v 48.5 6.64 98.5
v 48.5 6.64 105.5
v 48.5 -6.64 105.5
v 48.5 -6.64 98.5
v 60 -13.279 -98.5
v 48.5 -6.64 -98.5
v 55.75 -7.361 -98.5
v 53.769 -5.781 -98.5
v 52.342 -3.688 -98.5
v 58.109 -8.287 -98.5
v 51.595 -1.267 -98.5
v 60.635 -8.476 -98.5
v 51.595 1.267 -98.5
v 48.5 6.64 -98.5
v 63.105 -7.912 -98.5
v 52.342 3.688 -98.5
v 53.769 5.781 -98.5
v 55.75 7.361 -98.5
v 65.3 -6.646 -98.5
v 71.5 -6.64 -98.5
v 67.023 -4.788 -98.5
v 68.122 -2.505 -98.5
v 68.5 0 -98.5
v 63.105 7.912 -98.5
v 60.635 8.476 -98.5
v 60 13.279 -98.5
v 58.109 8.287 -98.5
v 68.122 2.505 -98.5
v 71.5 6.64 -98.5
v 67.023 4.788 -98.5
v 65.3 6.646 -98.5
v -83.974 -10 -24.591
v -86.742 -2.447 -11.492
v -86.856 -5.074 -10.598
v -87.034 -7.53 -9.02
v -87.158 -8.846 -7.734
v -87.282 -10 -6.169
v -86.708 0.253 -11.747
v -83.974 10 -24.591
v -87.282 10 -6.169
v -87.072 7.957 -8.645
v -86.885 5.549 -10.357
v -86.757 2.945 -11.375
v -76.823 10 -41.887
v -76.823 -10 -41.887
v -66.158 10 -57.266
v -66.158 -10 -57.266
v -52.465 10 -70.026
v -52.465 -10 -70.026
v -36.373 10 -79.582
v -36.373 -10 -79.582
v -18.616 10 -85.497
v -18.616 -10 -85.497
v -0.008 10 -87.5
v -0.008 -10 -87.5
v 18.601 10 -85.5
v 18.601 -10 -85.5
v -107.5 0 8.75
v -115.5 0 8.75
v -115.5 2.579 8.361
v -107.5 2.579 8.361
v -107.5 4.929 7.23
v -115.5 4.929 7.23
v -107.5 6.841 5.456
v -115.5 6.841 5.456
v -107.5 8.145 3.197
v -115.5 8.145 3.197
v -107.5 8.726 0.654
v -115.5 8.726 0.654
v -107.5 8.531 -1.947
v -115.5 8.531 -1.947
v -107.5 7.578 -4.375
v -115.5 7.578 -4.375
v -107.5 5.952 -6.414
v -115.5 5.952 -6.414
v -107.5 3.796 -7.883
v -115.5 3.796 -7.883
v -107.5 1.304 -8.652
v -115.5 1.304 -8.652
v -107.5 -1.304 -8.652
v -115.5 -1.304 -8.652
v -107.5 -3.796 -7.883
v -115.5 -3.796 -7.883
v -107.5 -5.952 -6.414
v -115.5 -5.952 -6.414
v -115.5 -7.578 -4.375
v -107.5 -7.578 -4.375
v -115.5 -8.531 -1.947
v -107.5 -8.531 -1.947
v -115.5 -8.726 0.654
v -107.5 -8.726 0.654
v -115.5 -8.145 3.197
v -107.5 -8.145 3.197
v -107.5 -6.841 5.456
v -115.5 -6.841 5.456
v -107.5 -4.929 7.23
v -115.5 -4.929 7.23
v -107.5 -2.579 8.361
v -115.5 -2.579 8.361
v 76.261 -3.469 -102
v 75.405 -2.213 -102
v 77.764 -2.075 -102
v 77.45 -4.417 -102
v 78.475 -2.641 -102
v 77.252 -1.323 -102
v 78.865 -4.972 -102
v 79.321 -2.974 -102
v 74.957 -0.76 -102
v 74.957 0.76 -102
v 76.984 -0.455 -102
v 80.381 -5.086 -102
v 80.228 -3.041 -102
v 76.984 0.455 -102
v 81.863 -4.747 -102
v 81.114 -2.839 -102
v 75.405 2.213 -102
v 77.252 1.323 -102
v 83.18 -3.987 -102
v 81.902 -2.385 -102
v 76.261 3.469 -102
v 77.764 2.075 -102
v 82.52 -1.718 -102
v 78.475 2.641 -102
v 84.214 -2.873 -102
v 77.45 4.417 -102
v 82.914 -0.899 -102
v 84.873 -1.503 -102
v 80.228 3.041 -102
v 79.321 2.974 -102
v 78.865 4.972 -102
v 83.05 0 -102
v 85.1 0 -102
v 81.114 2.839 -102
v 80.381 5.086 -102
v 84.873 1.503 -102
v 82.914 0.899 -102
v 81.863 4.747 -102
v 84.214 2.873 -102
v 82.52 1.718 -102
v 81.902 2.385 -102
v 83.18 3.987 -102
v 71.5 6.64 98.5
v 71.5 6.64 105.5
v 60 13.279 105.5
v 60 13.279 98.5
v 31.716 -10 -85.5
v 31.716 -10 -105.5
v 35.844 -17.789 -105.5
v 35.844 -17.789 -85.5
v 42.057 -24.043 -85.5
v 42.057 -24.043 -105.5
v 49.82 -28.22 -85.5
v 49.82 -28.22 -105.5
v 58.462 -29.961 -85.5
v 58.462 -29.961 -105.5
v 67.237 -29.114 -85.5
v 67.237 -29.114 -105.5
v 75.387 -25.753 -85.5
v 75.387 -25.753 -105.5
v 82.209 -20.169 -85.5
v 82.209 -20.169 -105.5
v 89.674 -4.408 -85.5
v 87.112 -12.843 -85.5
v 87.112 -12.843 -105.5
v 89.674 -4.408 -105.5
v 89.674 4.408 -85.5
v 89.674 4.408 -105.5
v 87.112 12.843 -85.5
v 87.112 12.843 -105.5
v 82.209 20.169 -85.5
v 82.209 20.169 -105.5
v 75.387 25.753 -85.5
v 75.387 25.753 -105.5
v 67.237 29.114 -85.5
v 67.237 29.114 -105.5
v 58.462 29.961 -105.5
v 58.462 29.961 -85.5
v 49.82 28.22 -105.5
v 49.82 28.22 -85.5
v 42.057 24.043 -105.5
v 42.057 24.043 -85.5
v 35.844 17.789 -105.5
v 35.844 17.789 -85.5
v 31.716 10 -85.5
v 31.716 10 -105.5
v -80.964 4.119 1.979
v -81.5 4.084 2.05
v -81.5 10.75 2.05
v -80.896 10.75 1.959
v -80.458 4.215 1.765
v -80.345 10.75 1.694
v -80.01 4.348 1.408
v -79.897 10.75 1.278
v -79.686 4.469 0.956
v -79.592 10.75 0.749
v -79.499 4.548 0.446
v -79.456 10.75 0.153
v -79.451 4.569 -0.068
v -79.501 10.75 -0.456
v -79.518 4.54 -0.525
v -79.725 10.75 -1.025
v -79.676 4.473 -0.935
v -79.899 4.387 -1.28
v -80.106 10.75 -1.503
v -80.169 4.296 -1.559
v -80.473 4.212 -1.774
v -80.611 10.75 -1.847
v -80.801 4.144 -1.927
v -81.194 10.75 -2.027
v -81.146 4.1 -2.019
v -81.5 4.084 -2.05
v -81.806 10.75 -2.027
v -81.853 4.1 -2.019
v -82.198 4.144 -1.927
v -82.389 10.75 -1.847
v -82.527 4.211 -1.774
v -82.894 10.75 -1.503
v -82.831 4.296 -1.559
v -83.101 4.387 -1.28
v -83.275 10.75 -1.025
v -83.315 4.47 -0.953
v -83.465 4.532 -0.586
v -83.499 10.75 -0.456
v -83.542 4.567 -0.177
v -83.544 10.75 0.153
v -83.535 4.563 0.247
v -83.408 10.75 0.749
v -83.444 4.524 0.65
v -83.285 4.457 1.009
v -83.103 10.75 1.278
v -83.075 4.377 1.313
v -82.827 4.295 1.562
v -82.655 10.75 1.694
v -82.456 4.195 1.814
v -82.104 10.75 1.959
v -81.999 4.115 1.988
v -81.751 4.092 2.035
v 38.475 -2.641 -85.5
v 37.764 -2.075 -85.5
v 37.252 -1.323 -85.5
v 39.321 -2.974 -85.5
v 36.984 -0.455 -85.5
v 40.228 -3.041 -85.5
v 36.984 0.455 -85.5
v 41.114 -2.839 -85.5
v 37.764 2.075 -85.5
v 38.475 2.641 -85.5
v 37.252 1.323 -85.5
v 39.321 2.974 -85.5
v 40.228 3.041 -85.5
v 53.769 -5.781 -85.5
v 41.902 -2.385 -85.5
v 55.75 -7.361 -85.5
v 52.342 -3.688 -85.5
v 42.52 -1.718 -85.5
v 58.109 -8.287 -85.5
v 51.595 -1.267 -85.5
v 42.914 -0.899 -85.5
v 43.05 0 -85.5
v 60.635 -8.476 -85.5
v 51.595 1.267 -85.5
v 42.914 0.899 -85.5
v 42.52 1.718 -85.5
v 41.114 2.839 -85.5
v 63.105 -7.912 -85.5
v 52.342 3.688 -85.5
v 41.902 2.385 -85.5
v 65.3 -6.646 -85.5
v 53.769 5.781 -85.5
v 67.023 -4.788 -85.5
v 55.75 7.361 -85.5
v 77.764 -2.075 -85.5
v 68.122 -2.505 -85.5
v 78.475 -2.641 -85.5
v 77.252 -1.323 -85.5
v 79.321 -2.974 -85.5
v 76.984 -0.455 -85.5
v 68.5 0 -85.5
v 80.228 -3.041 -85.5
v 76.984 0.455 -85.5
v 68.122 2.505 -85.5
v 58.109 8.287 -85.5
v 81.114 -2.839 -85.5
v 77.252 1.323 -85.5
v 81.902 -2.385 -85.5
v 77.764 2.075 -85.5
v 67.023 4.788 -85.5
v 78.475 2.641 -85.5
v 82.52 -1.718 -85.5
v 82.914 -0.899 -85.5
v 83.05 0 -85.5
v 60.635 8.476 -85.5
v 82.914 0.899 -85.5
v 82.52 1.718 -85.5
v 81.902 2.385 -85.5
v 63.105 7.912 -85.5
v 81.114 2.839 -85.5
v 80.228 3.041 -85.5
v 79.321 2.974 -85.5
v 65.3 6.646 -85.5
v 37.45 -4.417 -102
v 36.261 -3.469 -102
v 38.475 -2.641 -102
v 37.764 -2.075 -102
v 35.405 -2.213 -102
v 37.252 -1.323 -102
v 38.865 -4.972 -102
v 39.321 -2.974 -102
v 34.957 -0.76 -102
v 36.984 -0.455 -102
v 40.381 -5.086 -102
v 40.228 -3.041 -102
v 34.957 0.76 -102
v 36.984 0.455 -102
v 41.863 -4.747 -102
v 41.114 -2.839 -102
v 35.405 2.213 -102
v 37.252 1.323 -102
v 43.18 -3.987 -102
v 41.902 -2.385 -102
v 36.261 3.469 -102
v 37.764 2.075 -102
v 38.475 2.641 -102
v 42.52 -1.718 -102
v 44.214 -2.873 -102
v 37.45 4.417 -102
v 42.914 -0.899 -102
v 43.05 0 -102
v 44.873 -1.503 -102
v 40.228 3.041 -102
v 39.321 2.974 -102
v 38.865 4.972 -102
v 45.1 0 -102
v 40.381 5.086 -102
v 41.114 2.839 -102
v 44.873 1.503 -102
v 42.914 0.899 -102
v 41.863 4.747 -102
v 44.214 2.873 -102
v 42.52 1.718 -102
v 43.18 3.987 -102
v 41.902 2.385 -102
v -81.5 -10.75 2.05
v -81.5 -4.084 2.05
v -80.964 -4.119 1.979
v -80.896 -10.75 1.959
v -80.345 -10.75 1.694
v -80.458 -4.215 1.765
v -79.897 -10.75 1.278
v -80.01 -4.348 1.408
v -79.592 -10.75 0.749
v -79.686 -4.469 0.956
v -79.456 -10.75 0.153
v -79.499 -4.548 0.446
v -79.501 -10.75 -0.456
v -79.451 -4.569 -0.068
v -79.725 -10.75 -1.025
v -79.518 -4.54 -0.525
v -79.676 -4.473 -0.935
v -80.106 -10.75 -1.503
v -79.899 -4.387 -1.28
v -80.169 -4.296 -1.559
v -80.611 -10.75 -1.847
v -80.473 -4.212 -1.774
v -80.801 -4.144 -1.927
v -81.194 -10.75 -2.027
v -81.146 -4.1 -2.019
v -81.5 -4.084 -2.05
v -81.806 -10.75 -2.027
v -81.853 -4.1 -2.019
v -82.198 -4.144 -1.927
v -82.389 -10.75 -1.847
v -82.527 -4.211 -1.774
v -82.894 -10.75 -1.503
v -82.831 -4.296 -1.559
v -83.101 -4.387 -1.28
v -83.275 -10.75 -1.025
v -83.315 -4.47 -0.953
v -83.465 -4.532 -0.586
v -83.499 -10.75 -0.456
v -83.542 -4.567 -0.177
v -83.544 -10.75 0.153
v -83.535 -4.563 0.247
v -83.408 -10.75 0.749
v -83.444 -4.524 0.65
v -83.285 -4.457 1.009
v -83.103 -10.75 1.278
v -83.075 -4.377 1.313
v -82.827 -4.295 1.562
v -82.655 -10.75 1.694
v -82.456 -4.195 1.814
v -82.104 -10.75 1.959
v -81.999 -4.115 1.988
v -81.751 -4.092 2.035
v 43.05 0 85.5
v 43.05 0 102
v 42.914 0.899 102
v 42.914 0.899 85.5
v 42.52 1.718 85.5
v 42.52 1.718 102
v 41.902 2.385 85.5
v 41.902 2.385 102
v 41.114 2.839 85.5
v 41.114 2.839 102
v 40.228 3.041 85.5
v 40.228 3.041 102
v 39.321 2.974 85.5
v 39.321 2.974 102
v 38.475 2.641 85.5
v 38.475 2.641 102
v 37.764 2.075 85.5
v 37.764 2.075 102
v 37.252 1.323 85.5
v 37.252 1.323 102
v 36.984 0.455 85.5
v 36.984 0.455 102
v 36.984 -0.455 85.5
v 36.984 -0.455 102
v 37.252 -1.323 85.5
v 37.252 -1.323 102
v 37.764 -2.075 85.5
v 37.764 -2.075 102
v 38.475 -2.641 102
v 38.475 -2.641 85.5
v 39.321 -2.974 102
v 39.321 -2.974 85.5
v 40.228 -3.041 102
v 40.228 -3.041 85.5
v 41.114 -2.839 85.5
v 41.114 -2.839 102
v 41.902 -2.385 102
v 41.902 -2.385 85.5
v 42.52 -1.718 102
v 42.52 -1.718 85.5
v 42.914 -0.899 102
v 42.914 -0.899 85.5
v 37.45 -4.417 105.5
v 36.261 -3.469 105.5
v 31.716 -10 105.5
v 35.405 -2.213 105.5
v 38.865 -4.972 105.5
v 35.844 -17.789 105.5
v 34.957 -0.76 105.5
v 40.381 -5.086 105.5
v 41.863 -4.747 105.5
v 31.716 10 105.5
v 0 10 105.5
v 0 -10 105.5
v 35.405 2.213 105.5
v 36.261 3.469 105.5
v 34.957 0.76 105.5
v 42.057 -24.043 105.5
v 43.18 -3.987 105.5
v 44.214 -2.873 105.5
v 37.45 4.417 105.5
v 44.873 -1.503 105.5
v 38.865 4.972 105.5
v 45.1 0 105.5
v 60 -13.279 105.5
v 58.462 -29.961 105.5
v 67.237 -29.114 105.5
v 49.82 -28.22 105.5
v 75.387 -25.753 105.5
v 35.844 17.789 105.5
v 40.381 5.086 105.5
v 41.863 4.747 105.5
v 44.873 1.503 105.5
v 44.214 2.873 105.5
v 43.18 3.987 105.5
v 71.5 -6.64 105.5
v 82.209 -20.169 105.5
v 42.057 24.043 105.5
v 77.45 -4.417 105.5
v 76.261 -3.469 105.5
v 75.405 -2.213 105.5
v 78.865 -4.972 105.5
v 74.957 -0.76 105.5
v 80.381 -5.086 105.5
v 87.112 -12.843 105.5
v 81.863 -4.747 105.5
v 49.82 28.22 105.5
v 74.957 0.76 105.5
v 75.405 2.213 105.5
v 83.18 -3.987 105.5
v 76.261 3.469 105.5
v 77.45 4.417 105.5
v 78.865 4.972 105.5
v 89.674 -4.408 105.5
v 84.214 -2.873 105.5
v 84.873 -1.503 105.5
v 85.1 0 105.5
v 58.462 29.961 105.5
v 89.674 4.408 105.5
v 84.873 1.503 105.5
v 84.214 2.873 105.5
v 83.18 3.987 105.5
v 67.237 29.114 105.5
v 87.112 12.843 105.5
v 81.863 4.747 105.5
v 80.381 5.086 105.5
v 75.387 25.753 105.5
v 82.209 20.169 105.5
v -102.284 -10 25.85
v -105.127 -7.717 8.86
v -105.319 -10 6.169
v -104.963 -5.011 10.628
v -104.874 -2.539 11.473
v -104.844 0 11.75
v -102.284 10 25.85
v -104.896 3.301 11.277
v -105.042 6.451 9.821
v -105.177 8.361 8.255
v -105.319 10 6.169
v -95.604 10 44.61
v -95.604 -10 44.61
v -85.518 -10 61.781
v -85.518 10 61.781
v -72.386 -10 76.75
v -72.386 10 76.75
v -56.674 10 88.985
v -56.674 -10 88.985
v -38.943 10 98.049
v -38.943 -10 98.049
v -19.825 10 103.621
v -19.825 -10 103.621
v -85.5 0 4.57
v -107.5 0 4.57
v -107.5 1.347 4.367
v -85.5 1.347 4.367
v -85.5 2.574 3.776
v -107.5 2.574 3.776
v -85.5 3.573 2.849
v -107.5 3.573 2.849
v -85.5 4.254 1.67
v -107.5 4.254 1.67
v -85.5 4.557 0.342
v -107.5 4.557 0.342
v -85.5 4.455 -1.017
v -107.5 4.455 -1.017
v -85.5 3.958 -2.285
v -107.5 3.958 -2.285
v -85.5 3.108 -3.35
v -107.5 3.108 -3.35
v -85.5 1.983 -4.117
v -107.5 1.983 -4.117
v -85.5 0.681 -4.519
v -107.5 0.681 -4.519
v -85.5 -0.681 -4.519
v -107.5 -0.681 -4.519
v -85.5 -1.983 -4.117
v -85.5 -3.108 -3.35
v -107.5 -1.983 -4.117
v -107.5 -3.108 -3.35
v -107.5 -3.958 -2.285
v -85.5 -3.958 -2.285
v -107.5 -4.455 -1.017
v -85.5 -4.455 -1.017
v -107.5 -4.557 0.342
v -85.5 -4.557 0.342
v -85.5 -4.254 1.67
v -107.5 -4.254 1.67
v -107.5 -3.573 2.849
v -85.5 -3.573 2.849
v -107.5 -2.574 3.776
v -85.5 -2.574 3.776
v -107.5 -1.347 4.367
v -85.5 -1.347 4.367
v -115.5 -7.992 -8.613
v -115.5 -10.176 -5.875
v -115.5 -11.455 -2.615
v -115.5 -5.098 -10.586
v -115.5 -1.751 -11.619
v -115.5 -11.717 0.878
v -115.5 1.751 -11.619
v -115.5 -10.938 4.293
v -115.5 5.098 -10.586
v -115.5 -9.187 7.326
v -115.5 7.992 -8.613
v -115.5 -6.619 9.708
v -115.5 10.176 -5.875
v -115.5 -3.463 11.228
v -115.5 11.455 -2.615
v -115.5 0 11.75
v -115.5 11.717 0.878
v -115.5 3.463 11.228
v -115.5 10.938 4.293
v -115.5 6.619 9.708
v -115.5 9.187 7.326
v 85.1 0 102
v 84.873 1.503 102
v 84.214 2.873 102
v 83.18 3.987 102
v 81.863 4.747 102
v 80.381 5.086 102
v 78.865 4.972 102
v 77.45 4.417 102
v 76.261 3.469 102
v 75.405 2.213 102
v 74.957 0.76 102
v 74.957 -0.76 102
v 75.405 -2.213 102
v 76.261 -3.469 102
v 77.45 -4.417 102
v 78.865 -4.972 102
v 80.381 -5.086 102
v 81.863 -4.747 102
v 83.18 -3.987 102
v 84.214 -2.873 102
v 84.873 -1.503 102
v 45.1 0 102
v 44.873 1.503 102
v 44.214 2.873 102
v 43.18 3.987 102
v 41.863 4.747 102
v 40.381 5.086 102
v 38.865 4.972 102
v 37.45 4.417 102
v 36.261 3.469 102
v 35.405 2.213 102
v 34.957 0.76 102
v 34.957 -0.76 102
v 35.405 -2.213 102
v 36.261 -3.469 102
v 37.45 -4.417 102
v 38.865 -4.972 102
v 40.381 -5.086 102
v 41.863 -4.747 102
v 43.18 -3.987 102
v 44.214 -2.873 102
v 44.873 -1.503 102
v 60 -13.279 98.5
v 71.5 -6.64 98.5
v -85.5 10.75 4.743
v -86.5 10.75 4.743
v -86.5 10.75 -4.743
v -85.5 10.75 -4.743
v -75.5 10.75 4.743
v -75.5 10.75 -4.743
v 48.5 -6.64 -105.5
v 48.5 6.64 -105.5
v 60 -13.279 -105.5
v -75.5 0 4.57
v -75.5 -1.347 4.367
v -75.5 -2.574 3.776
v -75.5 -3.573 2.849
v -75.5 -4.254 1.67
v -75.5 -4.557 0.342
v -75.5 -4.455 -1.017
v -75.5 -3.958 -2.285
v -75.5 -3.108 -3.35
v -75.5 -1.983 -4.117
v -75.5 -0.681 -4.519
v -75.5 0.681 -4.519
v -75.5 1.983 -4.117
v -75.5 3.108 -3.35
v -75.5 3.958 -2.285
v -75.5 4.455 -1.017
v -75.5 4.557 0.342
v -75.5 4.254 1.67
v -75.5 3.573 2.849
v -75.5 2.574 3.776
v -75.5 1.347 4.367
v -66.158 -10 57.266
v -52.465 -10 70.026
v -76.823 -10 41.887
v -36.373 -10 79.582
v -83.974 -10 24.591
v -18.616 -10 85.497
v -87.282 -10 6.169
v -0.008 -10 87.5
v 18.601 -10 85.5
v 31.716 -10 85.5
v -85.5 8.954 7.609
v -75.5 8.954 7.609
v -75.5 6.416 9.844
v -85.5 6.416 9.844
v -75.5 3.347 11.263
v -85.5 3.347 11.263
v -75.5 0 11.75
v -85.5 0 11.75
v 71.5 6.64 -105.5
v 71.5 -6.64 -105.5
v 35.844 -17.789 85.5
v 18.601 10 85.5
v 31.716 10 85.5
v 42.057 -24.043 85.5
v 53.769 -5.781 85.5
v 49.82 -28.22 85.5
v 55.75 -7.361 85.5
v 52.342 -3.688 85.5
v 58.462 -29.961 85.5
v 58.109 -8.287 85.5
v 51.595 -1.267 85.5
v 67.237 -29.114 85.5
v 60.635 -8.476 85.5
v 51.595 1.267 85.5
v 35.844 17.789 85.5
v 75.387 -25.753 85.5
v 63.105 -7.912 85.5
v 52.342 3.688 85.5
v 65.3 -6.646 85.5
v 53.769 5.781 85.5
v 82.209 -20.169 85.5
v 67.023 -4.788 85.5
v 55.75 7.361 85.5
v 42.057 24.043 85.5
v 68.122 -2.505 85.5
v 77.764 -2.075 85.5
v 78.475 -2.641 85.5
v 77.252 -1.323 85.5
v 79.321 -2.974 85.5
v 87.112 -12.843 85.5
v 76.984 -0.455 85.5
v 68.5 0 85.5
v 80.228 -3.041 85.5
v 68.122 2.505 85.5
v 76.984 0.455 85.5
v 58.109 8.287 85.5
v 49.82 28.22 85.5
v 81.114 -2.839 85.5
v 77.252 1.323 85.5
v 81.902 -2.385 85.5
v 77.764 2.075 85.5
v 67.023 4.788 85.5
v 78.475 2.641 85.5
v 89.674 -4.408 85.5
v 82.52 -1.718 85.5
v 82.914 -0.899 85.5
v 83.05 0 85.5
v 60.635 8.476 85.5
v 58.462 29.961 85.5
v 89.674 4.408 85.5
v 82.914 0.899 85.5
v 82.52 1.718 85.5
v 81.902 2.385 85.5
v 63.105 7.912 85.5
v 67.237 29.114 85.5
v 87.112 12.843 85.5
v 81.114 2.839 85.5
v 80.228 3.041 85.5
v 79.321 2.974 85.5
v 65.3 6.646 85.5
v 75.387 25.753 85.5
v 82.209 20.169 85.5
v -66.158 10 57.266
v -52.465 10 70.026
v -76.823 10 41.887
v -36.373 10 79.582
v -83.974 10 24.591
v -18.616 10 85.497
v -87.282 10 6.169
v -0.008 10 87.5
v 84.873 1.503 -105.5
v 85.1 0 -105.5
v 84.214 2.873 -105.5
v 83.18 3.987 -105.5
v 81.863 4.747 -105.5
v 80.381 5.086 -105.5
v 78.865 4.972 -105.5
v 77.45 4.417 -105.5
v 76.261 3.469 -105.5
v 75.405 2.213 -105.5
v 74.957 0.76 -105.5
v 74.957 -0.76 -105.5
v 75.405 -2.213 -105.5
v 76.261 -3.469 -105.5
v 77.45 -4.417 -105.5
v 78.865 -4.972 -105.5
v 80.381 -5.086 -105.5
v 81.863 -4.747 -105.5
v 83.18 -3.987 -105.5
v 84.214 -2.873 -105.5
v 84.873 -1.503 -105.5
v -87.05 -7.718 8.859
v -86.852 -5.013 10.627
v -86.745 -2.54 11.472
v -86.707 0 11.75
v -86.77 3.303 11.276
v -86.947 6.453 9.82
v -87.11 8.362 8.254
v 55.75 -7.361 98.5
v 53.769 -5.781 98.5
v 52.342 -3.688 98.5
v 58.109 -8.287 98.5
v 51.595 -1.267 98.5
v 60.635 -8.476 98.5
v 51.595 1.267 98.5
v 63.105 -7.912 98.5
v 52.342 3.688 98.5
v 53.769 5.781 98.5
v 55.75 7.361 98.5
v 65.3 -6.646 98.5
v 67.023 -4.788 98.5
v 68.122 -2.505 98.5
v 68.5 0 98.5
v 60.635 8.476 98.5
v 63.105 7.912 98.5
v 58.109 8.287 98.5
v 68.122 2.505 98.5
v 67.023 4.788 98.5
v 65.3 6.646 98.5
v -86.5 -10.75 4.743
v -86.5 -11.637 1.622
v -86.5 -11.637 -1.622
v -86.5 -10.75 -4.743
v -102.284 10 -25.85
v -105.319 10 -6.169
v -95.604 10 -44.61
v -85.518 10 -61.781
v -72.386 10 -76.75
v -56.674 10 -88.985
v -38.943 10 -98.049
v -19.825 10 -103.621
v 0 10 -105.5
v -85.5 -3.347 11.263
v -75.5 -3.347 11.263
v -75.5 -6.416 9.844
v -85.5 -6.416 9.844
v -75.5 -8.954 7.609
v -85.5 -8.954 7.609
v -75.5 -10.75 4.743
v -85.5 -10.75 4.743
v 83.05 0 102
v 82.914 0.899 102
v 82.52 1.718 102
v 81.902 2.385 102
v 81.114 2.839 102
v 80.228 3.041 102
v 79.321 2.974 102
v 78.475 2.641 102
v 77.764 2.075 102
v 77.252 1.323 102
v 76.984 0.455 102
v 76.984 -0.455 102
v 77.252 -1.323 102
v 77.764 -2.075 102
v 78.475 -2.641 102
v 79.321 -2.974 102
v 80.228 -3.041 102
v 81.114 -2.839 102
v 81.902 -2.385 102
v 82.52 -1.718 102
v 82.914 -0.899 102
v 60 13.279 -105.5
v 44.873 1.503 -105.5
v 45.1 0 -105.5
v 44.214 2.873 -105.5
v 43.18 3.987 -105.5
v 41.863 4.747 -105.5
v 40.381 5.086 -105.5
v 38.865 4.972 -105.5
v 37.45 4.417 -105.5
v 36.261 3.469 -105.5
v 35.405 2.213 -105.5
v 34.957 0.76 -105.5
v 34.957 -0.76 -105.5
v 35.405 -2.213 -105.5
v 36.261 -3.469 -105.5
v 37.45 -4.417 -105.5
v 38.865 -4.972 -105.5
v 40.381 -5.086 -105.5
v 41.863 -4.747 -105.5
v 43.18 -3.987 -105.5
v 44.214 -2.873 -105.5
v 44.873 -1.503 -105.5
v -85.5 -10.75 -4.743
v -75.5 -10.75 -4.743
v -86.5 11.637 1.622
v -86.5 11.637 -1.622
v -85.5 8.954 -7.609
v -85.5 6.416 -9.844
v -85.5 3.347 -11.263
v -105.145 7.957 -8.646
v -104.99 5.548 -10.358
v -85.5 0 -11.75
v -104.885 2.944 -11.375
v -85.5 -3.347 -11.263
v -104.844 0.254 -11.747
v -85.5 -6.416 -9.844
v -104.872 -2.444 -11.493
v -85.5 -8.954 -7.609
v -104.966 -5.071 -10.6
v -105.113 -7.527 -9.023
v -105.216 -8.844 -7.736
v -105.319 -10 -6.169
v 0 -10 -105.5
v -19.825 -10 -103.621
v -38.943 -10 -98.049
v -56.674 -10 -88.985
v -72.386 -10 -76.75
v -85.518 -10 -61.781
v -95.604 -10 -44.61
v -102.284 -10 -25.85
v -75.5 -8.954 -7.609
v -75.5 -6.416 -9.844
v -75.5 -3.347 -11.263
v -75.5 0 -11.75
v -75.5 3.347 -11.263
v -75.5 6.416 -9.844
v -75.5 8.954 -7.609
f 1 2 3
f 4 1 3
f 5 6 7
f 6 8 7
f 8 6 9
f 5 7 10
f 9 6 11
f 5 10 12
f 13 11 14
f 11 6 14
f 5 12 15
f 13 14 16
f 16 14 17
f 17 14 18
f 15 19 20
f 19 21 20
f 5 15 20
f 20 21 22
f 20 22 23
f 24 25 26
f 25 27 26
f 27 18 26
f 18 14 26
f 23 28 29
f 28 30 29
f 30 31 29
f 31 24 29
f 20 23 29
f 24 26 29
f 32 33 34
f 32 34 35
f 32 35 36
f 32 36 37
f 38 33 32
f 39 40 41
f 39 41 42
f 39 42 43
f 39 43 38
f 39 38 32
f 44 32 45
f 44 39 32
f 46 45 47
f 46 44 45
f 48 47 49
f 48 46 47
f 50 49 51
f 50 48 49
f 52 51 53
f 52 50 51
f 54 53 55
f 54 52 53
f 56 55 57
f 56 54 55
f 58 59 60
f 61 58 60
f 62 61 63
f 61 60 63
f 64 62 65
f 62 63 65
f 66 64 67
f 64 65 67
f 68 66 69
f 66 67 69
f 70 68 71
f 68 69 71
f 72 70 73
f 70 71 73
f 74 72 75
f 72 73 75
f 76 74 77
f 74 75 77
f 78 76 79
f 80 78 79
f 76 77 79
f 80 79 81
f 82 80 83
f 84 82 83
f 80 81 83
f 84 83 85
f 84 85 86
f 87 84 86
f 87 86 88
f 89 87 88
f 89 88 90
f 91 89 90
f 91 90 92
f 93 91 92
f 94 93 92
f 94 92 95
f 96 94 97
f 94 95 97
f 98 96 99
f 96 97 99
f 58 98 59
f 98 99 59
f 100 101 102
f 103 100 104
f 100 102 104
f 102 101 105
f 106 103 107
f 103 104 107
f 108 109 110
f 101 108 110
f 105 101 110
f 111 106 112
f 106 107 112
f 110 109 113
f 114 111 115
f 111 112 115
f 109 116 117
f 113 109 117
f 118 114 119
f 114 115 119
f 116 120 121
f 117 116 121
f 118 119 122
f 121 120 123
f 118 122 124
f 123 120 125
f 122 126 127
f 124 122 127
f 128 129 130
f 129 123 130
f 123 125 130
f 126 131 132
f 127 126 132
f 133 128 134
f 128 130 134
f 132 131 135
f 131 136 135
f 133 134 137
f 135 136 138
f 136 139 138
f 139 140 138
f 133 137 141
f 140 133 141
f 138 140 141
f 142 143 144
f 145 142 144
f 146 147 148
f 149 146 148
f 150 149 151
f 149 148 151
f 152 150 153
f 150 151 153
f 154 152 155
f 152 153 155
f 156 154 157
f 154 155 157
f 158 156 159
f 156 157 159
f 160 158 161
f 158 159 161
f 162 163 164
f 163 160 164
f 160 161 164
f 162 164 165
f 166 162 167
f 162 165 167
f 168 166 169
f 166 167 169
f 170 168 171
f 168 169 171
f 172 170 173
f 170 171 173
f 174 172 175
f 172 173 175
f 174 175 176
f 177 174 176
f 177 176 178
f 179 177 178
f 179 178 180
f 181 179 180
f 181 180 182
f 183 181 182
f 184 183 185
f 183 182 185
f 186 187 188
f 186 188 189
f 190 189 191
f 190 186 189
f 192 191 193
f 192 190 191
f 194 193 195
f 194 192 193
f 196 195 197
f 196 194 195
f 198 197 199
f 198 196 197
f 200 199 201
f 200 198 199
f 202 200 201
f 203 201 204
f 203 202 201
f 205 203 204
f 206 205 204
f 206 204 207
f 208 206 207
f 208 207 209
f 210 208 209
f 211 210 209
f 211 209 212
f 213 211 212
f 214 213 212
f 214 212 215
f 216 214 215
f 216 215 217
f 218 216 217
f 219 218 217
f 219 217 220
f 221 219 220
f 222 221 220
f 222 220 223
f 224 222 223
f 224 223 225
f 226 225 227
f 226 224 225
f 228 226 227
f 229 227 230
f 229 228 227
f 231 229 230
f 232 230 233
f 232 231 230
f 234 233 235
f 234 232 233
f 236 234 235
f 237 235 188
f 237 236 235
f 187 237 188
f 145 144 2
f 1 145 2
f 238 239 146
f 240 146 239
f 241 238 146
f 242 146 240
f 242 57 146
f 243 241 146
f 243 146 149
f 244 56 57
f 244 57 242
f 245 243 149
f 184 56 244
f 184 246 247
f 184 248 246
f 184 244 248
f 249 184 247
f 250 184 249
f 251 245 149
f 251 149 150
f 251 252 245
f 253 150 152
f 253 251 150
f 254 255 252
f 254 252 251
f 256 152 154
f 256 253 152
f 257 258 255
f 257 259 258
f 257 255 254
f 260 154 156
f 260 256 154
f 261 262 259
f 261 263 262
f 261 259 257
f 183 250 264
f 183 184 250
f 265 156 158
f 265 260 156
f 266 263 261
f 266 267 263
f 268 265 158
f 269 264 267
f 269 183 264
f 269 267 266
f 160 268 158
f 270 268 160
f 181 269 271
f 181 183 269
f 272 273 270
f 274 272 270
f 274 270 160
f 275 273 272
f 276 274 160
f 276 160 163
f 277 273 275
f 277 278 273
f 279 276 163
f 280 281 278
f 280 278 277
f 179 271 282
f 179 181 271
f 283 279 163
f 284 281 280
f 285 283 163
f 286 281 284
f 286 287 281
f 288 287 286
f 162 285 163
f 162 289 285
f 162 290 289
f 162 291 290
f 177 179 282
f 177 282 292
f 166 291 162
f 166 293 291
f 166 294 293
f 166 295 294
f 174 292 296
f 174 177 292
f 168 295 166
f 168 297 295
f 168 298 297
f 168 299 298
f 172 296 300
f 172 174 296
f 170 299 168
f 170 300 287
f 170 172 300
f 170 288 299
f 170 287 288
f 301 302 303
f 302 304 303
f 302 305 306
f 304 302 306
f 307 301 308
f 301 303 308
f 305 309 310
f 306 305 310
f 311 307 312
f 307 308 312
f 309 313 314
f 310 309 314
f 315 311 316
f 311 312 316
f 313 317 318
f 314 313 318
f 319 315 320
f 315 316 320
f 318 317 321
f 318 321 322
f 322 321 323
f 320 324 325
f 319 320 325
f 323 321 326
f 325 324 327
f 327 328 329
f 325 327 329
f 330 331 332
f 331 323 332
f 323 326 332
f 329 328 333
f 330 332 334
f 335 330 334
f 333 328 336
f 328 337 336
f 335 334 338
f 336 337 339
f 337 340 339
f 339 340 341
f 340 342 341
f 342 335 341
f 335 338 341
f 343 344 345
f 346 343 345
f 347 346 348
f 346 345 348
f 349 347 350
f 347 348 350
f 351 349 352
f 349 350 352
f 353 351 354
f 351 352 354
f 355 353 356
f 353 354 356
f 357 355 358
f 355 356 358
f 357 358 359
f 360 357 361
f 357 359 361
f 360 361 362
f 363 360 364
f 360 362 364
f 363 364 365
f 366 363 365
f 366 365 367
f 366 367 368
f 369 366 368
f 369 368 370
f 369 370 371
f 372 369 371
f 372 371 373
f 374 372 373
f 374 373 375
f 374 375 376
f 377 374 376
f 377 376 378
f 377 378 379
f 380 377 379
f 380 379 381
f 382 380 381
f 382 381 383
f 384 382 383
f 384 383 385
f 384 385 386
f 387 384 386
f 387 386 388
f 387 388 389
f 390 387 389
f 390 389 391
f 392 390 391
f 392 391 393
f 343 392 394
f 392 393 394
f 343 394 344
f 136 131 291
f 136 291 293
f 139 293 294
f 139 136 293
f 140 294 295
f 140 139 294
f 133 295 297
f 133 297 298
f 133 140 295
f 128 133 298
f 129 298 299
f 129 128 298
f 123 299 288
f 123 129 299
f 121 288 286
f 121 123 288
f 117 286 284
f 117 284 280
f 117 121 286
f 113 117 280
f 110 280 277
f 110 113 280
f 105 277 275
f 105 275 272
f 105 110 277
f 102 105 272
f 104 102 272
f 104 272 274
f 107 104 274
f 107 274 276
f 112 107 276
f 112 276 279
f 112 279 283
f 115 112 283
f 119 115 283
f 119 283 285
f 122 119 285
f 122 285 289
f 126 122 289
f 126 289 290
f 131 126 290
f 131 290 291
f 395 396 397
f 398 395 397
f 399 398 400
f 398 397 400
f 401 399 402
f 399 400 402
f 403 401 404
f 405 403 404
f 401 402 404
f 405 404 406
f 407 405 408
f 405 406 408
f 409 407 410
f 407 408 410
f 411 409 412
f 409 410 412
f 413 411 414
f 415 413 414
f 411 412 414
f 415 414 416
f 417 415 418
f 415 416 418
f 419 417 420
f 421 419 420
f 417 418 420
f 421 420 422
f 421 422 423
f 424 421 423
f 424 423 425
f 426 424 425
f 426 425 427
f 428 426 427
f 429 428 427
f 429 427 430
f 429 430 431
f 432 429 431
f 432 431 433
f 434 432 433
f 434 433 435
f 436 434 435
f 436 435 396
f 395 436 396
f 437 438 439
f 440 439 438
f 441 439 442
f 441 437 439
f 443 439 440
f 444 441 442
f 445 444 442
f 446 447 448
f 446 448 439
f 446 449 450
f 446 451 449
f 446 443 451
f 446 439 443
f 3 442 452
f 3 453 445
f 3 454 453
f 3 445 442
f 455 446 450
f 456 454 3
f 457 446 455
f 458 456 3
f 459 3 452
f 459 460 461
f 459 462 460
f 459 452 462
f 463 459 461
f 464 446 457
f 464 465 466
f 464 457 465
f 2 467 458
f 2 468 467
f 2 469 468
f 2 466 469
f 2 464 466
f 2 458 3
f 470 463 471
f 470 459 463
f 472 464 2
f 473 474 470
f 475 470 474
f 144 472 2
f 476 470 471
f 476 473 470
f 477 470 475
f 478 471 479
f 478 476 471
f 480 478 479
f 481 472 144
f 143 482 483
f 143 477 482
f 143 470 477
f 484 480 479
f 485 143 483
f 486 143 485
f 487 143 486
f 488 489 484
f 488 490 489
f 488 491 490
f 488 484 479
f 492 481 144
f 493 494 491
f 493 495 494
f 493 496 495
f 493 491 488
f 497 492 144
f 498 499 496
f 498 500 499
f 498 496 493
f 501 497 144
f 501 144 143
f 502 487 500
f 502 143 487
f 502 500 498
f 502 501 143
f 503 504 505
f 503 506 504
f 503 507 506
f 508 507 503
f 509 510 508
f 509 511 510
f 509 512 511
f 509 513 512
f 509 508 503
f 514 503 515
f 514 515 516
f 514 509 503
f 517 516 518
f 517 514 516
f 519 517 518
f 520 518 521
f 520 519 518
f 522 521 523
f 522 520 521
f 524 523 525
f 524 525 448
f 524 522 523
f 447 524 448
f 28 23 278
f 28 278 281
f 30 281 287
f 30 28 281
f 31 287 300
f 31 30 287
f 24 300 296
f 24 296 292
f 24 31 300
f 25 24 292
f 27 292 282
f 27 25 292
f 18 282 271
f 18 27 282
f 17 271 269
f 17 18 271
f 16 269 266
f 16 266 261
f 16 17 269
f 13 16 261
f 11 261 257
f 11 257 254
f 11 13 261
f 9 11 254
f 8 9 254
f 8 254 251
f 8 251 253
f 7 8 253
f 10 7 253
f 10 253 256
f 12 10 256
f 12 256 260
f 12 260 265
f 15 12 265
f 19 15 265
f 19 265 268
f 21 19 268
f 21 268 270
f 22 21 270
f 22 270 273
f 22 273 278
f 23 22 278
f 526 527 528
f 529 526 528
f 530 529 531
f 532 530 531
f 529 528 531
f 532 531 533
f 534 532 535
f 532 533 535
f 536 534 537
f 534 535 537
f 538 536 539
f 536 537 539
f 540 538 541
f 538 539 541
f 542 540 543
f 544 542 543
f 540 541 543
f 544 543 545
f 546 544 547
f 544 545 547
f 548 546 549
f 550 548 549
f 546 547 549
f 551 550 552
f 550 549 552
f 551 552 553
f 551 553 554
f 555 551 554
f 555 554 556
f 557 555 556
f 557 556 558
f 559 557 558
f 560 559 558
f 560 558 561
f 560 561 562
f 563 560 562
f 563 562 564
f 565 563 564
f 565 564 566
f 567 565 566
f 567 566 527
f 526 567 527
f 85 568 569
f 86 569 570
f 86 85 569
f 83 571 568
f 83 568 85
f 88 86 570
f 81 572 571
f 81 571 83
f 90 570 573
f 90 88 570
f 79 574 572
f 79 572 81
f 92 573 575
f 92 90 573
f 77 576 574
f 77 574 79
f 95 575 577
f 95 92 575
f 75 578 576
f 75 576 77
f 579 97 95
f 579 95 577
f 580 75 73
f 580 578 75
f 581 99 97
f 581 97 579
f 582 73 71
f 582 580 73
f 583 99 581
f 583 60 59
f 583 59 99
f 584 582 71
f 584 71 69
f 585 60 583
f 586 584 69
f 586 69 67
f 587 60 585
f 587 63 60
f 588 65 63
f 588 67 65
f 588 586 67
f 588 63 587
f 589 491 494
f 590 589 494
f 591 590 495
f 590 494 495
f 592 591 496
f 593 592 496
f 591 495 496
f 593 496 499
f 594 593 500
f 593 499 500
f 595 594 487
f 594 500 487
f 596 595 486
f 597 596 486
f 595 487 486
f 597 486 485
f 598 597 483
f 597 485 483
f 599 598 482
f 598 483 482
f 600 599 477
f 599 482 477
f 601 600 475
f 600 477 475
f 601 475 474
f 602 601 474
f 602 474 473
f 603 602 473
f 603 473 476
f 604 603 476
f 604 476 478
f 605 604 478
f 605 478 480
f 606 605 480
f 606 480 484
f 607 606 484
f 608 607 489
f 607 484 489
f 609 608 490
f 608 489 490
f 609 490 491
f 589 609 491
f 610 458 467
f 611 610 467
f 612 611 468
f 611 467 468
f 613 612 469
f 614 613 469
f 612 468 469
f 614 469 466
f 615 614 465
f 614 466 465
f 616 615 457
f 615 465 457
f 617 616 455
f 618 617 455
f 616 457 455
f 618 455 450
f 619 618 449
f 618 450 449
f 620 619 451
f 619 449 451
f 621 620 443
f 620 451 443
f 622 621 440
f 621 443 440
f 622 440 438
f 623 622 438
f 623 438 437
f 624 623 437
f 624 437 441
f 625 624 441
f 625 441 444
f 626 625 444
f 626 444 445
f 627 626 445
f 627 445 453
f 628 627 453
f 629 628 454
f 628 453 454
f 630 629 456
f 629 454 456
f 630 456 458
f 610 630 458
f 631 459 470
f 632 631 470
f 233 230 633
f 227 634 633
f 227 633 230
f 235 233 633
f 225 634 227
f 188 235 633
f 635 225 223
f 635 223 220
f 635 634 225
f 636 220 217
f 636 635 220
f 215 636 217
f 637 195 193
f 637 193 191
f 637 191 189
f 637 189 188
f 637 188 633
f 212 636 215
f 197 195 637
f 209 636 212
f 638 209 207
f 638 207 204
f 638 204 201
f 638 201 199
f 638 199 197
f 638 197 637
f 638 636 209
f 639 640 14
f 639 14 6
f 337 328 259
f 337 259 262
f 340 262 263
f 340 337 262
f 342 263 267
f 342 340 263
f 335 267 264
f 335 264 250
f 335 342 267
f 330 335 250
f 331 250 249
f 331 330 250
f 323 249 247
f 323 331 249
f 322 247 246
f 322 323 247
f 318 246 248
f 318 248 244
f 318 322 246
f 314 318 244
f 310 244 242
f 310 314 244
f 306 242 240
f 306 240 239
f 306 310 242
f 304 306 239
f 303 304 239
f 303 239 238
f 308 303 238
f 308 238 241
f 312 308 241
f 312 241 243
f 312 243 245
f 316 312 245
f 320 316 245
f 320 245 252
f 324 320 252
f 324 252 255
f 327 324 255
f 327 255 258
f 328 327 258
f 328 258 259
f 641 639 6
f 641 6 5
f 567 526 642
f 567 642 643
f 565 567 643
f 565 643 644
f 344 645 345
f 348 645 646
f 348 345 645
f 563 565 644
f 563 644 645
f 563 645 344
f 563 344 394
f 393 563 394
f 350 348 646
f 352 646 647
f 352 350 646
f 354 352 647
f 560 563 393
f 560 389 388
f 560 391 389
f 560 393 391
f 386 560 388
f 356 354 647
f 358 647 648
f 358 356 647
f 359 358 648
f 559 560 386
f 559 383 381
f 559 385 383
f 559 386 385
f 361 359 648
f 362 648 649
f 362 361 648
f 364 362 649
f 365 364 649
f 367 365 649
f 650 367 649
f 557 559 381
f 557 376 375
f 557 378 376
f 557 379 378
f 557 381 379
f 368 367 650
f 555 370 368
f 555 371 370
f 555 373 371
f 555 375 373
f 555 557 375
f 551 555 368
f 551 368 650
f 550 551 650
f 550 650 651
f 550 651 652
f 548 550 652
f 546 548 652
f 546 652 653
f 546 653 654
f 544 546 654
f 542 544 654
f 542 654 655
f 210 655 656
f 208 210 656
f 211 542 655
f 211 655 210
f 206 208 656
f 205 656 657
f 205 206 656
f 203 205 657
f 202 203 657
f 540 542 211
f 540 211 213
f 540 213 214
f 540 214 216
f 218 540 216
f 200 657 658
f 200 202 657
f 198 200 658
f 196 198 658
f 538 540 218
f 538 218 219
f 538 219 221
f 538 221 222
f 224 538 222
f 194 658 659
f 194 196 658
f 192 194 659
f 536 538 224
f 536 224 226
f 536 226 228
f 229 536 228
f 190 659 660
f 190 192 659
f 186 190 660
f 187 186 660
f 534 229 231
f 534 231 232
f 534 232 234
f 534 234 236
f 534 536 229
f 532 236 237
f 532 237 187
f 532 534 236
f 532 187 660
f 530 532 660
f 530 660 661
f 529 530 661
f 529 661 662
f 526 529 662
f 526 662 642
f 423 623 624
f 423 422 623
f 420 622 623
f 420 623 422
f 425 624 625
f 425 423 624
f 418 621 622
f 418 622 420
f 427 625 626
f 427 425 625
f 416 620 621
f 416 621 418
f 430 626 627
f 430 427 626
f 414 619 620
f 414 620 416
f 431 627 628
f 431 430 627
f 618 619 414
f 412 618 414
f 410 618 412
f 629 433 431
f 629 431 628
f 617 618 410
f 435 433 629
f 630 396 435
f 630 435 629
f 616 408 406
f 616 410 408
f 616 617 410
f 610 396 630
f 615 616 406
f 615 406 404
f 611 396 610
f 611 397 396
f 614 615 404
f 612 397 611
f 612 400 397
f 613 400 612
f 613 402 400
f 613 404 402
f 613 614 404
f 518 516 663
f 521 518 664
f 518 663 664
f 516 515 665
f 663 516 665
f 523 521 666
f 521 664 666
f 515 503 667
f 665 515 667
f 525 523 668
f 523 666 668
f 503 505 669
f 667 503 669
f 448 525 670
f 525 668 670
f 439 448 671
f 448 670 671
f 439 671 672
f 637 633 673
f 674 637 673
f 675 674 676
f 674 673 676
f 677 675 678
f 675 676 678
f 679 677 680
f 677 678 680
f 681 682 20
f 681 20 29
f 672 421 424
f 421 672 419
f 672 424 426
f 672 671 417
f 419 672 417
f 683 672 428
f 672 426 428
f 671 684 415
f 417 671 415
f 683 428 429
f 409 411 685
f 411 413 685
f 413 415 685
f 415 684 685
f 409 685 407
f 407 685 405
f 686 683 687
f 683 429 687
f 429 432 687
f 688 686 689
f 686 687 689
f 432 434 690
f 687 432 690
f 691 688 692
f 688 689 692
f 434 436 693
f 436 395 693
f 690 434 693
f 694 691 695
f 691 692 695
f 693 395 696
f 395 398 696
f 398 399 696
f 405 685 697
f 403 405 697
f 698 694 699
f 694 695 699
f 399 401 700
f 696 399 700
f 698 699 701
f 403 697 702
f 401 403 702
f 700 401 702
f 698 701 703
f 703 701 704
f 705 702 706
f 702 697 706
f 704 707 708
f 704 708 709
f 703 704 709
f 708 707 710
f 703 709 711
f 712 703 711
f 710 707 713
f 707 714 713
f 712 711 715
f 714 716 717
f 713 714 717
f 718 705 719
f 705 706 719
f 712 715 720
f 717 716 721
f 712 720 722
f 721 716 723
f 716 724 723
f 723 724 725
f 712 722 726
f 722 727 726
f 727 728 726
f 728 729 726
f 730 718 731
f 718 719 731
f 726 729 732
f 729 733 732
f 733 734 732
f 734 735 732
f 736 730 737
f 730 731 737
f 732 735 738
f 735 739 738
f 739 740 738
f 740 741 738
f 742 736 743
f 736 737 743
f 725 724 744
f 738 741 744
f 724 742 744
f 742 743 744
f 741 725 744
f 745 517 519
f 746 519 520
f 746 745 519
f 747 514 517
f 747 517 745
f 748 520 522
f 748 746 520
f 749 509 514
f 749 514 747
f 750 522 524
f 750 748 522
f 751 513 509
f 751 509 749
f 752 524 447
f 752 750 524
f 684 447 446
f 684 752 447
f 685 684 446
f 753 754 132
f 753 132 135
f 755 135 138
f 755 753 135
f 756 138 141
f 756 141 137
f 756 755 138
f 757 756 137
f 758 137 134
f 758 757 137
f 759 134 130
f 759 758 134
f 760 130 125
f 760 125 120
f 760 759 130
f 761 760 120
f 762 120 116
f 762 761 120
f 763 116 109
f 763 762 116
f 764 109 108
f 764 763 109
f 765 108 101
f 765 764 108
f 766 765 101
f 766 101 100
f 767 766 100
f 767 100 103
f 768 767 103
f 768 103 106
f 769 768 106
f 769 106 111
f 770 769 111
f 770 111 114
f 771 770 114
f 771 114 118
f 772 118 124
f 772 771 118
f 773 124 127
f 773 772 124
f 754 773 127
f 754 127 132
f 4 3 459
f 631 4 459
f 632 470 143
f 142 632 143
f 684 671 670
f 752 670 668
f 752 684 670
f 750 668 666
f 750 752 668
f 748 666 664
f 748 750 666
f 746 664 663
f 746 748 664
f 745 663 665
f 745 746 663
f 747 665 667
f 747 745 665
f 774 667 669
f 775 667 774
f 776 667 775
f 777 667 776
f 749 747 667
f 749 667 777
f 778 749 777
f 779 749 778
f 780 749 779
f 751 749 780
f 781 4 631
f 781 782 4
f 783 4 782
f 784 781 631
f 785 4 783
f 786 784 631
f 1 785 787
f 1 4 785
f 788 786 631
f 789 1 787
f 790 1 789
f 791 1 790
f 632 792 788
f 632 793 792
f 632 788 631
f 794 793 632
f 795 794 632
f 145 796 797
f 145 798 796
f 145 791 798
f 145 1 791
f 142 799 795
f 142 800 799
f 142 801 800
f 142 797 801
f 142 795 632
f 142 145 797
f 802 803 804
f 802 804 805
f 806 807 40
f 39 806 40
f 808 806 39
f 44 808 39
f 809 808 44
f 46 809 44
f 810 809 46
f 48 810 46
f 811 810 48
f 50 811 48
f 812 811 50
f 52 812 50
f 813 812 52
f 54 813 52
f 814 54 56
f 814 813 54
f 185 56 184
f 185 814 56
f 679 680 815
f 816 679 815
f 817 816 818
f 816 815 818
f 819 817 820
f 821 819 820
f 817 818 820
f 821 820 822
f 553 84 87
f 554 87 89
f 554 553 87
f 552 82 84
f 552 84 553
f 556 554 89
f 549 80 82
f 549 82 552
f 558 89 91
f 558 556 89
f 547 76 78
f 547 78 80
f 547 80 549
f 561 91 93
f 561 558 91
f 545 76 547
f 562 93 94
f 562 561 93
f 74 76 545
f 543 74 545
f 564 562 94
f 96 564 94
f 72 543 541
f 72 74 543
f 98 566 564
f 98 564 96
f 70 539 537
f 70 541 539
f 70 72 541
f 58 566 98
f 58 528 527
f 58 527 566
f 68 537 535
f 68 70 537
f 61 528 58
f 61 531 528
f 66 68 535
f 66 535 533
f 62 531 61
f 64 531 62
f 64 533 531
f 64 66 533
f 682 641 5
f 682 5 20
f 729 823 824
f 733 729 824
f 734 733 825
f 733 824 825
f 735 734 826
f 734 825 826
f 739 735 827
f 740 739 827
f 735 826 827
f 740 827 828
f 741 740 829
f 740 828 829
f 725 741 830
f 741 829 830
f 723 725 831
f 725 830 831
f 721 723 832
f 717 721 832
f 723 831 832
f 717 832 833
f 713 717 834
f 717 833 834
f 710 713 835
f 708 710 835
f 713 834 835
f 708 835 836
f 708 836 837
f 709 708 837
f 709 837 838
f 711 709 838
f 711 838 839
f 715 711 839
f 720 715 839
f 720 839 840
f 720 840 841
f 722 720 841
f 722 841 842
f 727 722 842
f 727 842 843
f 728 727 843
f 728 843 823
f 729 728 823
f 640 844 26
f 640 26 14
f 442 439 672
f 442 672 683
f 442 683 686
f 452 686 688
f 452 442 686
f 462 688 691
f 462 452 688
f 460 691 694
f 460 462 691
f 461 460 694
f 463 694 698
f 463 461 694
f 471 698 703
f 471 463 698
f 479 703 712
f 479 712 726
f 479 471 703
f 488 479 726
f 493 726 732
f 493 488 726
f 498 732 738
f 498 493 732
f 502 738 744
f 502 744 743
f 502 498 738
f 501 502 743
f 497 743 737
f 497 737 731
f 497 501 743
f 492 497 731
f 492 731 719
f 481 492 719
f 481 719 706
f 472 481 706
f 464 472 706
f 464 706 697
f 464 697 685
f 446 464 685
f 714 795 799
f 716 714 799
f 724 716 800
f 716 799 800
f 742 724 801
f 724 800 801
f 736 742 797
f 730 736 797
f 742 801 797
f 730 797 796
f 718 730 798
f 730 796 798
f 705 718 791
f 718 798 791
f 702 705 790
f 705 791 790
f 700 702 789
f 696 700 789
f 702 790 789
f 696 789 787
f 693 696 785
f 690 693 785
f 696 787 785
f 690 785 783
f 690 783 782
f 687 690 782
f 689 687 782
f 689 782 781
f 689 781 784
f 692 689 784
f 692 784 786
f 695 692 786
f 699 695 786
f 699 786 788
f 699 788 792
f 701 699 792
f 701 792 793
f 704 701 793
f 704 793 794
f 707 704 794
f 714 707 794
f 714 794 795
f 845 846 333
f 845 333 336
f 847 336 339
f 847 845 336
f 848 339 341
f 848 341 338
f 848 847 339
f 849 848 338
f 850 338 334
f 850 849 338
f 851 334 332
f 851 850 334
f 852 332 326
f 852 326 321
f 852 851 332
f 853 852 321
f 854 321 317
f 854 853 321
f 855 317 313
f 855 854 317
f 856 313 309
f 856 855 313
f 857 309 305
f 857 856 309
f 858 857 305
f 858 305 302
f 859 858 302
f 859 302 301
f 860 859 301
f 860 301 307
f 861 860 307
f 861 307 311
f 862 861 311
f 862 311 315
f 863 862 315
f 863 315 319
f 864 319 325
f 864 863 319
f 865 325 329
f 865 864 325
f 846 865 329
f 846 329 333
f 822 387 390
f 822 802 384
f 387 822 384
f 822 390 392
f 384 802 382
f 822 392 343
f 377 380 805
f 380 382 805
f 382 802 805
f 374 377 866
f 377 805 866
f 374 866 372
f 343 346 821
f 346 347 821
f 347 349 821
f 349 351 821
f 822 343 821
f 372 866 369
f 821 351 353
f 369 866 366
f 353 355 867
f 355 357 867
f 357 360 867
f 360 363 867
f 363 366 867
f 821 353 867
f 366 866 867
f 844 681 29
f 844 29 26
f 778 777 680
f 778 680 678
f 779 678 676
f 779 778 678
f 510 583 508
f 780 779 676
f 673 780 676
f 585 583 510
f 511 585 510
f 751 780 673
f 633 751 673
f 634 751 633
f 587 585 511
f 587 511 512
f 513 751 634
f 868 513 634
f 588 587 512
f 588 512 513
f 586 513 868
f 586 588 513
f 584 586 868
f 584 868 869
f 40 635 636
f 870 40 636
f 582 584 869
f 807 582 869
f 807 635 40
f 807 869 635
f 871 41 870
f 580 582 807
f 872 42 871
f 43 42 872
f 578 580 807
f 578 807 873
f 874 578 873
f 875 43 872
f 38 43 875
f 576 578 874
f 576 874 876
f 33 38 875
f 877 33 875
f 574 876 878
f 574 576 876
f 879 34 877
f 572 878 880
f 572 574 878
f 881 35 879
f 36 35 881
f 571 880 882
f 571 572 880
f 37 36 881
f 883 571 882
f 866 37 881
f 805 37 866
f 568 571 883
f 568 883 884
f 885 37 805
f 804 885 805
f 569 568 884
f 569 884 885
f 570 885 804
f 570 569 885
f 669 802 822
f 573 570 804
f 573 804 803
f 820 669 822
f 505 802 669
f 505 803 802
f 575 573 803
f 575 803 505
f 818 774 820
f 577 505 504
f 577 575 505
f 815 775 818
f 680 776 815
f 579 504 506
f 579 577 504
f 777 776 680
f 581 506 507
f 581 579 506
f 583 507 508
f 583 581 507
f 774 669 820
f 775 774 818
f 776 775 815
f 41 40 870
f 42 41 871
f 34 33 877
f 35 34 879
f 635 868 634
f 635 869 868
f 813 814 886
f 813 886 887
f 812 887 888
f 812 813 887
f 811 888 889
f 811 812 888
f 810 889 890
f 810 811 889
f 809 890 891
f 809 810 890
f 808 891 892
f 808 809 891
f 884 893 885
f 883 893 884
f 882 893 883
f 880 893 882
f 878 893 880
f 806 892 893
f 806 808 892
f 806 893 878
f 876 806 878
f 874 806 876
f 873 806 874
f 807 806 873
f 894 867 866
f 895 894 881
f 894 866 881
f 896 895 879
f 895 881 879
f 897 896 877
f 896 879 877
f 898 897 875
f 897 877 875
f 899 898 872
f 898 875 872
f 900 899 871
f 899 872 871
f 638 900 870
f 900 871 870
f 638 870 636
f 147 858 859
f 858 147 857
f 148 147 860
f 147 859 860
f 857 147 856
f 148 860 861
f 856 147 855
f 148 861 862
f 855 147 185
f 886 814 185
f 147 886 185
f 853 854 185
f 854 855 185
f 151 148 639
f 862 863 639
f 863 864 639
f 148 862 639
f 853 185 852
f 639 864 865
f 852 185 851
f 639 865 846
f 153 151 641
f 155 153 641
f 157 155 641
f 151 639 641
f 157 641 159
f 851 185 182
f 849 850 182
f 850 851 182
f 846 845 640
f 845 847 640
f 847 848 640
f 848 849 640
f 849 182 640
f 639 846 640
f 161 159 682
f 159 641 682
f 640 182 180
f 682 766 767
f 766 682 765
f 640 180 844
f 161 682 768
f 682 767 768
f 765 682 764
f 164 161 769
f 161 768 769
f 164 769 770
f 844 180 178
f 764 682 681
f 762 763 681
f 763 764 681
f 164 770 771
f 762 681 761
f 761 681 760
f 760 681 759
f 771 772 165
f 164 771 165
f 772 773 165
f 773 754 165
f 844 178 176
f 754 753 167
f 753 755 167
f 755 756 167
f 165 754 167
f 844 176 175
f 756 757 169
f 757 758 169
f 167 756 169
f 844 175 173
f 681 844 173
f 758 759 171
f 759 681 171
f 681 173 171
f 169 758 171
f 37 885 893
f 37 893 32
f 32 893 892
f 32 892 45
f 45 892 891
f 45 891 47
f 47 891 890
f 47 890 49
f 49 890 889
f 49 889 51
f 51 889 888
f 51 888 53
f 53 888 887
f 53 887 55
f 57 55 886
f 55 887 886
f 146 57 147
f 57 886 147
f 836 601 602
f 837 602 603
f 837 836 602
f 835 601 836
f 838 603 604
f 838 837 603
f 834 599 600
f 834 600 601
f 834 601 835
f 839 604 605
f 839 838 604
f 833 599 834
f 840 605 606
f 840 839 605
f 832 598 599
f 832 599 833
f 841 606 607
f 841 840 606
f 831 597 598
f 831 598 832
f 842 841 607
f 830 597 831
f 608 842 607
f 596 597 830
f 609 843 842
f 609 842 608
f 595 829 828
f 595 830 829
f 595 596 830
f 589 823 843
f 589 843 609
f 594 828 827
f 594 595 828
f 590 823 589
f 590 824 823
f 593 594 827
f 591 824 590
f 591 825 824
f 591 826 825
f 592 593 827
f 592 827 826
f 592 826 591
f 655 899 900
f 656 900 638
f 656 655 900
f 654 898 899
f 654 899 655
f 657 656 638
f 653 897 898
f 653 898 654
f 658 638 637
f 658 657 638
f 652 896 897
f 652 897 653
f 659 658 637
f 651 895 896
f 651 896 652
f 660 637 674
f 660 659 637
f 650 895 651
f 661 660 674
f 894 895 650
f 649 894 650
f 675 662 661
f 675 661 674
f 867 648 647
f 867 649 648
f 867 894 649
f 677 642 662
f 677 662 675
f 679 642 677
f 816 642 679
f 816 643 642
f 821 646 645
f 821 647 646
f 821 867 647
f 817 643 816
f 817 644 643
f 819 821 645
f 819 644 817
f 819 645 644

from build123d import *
from build123d.topology import SkipClean

# Parameters (mm, degrees)
BOSS_EXTRUDE1_DEPTH      = 10
BOSS_EXTRUDE1_DEPTH_BACK = 10
SKETCH2_R                = 30
BOSS_EXTRUDE2_DEPTH      = 20
CUT_EXTRUDE1_REACH       = 239.805
SKETCH3_R                = 8.5
SKETCH3_R_2              = 3.05
CUT_EXTRUDE3_DEPTH       = 155.468443379
SKETCH7_R                = 8.5
CUT_EXTRUDE4_DEPTH       = 7
BOSS_EXTRUDE3_DEPTH      = 10
BOSS_EXTRUDE3_DEPTH_BACK = 20
SKETCH8_R                = 11.75
SKETCH9_R                = 8.75
CUT_EXTRUDE5_DEPTH       = 8
SKETCH10_R               = 4.57
CUT_EXTRUDE6_DEPTH       = 226.912593764
SKETCH11_R               = 11.75
SKETCH11_R_2             = 4.57
BOSS_EXTRUDE4_DEPTH      = 10
CUT_EXTRUDE7_DEPTH       = 160.281198025
CUT_EXTRUDE7_DEPTH_BACK  = 160.281198025
SKETCH12_R               = 2.05
SKETCH13_R               = 5.1
SKETCH13_R_2             = 3.05
CUT_EXTRUDE8_DEPTH       = 3.5
SKETCH14_W               = 11
SKETCH14_H               = 23.5
CUT_EXTRUDE9_DEPTH       = 1


with BuildPart() as part:
    # Sketch1 → Boss-Extrude1 (new, two sides: drawn at the far end of the back side and taken through both)
    with BuildSketch(Plane(origin=(0, 0, 0), x_dir=(1, 0, 0), z_dir=(0, 1, 0)).offset(-BOSS_EXTRUDE1_DEPTH_BACK)):
        with BuildLine():
            ThreePointArc((0, -85.5), (-85.5, 0), (0, 85.5))
            Line((0, 85.5), (80, 85.5))
            Line((80, 85.5), (80, 105.5))
            Line((80, 105.5), (0, 105.5))
            ThreePointArc((0, 105.5), (-105.5, 0), (0, -105.5))
            Line((0, -105.5), (80, -105.5))
            Line((80, -105.5), (80, -85.5))
            Line((80, -85.5), (0, -85.5))
        make_face()
    extrude(amount=BOSS_EXTRUDE1_DEPTH + BOSS_EXTRUDE1_DEPTH_BACK)

    # Sketch2 → Boss-Extrude2 (add)
    with BuildSketch(Plane.XY.offset(105.5)):
        with Locations((60, 0)):
            Circle(SKETCH2_R)
    boss_extrude2 = extrude(amount=-BOSS_EXTRUDE2_DEPTH)

    # Sketch3 → Cut-Extrude1 (cut, up to next)
    with BuildSketch(Plane.XY.offset(105.5), mode=Mode.PRIVATE) as cut_extrude1_sk1:
        with Locations((60, 0)):
            Circle(SKETCH3_R)
    cut_extrude1_tool1 = extrude(cut_extrude1_sk1.sketch, amount=-CUT_EXTRUDE1_REACH, mode=Mode.PRIVATE) & part.part
    # Sketch3 → Cut-Extrude1 (cut, up to next)
    with BuildSketch(Plane.XY.offset(105.5), mode=Mode.PRIVATE) as cut_extrude1_sk2:
        with Locations((80, 0)):
            Circle(SKETCH3_R_2)
    cut_extrude1_tool2 = extrude(cut_extrude1_sk2.sketch, amount=-CUT_EXTRUDE1_REACH, mode=Mode.PRIVATE) & part.part
    # Sketch3 → Cut-Extrude1 (cut, up to next)
    with BuildSketch(Plane.XY.offset(105.5), mode=Mode.PRIVATE) as cut_extrude1_sk3:
        with Locations((40, 0)):
            Circle(SKETCH3_R_2)
    cut_extrude1_tool3 = extrude(cut_extrude1_sk3.sketch, amount=-CUT_EXTRUDE1_REACH, mode=Mode.PRIVATE) & part.part
    cut_extrude1_1 = cut_extrude1_tool1.solids().sort_by_distance((60, 0, 105.5))[0]
    add(cut_extrude1_1, mode=Mode.SUBTRACT)
    cut_extrude1_2 = cut_extrude1_tool2.solids().sort_by_distance((80, 0, 105.5))[0]
    add(cut_extrude1_2, mode=Mode.SUBTRACT)
    cut_extrude1_3 = cut_extrude1_tool3.solids().sort_by_distance((40, 0, 105.5))[0]
    add(cut_extrude1_3, mode=Mode.SUBTRACT)
    cut_extrude1 = cut_extrude1_1 + cut_extrude1_2 + cut_extrude1_3  # Cut-Extrude1 as one shape, for the pattern or mirror that repeats it

    # Mirror2: Boss-Extrude2, Cut-Extrude1 across plane
    add(boss_extrude2.mirror(Plane.XY))
    add(cut_extrude1.mirror(Plane.XY), mode=Mode.SUBTRACT)

    # Sketch6 → Cut-Extrude3 (cut, through all)
    with BuildSketch(Plane(origin=(0, 10, 0), x_dir=(1, 0, 0), z_dir=(0, 1, 0))):
        with BuildLine():
            Line((31.715728753, 81.549755056), (31.715728753, -81.549755056))
            ThreePointArc((31.715728753, -81.549755056), (-87.5, 0), (31.715728753, 81.549755056))
        make_face()
    extrude(amount=-CUT_EXTRUDE3_DEPTH, mode=Mode.SUBTRACT)

    # Sketch7 → Cut-Extrude4 (cut)
    with BuildSketch(Plane.XY.offset(105.5)):
        Polygon((60, 13.279056191), (48.5, 6.639528096), (48.5, -6.639528096), (60, -13.279056191), (71.5, -6.639528096), (71.5, 6.639528096), align=None)
        with Locations((60, 0)):
            Circle(SKETCH7_R, mode=Mode.SUBTRACT)
    cut_extrude4 = extrude(amount=-CUT_EXTRUDE4_DEPTH, mode=Mode.SUBTRACT)

    # Mirror3: Cut-Extrude4 across plane
    add(cut_extrude4.mirror(Plane.XY), mode=Mode.SUBTRACT)

    # Sketch8 → Boss-Extrude3 (add, two sides: drawn at the far end of the back side and taken through both)
    with BuildSketch(Plane.ZY.offset(105.5).offset(-BOSS_EXTRUDE3_DEPTH_BACK)):
        Circle(SKETCH8_R)
    extrude(amount=BOSS_EXTRUDE3_DEPTH + BOSS_EXTRUDE3_DEPTH_BACK)

    # Sketch9 → Cut-Extrude5 (cut)
    with BuildSketch(Plane.ZY.offset(115.5)):
        Circle(SKETCH9_R)
    extrude(amount=-CUT_EXTRUDE5_DEPTH, mode=Mode.SUBTRACT)

    # Sketch10 → Cut-Extrude6 (cut, through all)
    with BuildSketch(Plane.ZY.offset(107.5)):
        Circle(SKETCH10_R)
    extrude(amount=-CUT_EXTRUDE6_DEPTH, mode=Mode.SUBTRACT)

    # Sketch11 → Boss-Extrude4 (add)
    with BuildSketch(Plane(origin=(-85.5, 0, 0), x_dir=(0, 0, -1), z_dir=(1, 0, 0))):
        Circle(SKETCH11_R)
        Circle(SKETCH11_R_2, mode=Mode.SUBTRACT)
    extrude(amount=BOSS_EXTRUDE4_DEPTH)

    # Sketch12 → Cut-Extrude7 (cut, two sides: drawn at the far end of the back side and taken through both)
    with BuildSketch(Plane(origin=(0, 0, 0), x_dir=(1, 0, 0), z_dir=(0, 1, 0)).offset(-CUT_EXTRUDE7_DEPTH_BACK)):
        with Locations((-81.5, 0)):
            Circle(SKETCH12_R)
    extrude(amount=CUT_EXTRUDE7_DEPTH + CUT_EXTRUDE7_DEPTH_BACK, mode=Mode.SUBTRACT)

    # Sketch13 → Cut-Extrude8 (cut)
    # profile 1 of 2: a face of its own
    with BuildSketch(Plane.XY.offset(105.5)):
        with Locations((40, 0)):
            Circle(SKETCH13_R)
        with Locations((40, 0)):
            Circle(SKETCH13_R_2, mode=Mode.SUBTRACT)
    # profile 2 of 2: a face of its own
    with BuildSketch(Plane.XY.offset(105.5)):
        with Locations((80, 0)):
            Circle(SKETCH13_R)
        with Locations((80, 0)):
            Circle(SKETCH13_R_2, mode=Mode.SUBTRACT)
    cut_extrude8 = extrude(amount=-CUT_EXTRUDE8_DEPTH, mode=Mode.SUBTRACT)

    # Mirror4: Cut-Extrude8 across plane
    add(cut_extrude8.mirror(Plane.XY), mode=Mode.SUBTRACT)

    # Sketch14 → Cut-Extrude9 (cut)
    with SkipClean():  # the faces are left unmerged after this step: merging them gives an invalid solid
        with BuildSketch(Plane(origin=(0, 11.75, 0), x_dir=(1, 0, 0), z_dir=(0, 1, 0))):
            with Locations((-81, 0)):
                Rectangle(SKETCH14_W, SKETCH14_H)
        cut_extrude9 = extrude(amount=-CUT_EXTRUDE9_DEPTH, mode=Mode.SUBTRACT)

    # Mirror5: Cut-Extrude9 across plane
    with SkipClean():  # the faces are left unmerged after this step: merging them gives an invalid solid
        add(cut_extrude9.mirror(Plane.ZX), mode=Mode.SUBTRACT)


solid = part.part
